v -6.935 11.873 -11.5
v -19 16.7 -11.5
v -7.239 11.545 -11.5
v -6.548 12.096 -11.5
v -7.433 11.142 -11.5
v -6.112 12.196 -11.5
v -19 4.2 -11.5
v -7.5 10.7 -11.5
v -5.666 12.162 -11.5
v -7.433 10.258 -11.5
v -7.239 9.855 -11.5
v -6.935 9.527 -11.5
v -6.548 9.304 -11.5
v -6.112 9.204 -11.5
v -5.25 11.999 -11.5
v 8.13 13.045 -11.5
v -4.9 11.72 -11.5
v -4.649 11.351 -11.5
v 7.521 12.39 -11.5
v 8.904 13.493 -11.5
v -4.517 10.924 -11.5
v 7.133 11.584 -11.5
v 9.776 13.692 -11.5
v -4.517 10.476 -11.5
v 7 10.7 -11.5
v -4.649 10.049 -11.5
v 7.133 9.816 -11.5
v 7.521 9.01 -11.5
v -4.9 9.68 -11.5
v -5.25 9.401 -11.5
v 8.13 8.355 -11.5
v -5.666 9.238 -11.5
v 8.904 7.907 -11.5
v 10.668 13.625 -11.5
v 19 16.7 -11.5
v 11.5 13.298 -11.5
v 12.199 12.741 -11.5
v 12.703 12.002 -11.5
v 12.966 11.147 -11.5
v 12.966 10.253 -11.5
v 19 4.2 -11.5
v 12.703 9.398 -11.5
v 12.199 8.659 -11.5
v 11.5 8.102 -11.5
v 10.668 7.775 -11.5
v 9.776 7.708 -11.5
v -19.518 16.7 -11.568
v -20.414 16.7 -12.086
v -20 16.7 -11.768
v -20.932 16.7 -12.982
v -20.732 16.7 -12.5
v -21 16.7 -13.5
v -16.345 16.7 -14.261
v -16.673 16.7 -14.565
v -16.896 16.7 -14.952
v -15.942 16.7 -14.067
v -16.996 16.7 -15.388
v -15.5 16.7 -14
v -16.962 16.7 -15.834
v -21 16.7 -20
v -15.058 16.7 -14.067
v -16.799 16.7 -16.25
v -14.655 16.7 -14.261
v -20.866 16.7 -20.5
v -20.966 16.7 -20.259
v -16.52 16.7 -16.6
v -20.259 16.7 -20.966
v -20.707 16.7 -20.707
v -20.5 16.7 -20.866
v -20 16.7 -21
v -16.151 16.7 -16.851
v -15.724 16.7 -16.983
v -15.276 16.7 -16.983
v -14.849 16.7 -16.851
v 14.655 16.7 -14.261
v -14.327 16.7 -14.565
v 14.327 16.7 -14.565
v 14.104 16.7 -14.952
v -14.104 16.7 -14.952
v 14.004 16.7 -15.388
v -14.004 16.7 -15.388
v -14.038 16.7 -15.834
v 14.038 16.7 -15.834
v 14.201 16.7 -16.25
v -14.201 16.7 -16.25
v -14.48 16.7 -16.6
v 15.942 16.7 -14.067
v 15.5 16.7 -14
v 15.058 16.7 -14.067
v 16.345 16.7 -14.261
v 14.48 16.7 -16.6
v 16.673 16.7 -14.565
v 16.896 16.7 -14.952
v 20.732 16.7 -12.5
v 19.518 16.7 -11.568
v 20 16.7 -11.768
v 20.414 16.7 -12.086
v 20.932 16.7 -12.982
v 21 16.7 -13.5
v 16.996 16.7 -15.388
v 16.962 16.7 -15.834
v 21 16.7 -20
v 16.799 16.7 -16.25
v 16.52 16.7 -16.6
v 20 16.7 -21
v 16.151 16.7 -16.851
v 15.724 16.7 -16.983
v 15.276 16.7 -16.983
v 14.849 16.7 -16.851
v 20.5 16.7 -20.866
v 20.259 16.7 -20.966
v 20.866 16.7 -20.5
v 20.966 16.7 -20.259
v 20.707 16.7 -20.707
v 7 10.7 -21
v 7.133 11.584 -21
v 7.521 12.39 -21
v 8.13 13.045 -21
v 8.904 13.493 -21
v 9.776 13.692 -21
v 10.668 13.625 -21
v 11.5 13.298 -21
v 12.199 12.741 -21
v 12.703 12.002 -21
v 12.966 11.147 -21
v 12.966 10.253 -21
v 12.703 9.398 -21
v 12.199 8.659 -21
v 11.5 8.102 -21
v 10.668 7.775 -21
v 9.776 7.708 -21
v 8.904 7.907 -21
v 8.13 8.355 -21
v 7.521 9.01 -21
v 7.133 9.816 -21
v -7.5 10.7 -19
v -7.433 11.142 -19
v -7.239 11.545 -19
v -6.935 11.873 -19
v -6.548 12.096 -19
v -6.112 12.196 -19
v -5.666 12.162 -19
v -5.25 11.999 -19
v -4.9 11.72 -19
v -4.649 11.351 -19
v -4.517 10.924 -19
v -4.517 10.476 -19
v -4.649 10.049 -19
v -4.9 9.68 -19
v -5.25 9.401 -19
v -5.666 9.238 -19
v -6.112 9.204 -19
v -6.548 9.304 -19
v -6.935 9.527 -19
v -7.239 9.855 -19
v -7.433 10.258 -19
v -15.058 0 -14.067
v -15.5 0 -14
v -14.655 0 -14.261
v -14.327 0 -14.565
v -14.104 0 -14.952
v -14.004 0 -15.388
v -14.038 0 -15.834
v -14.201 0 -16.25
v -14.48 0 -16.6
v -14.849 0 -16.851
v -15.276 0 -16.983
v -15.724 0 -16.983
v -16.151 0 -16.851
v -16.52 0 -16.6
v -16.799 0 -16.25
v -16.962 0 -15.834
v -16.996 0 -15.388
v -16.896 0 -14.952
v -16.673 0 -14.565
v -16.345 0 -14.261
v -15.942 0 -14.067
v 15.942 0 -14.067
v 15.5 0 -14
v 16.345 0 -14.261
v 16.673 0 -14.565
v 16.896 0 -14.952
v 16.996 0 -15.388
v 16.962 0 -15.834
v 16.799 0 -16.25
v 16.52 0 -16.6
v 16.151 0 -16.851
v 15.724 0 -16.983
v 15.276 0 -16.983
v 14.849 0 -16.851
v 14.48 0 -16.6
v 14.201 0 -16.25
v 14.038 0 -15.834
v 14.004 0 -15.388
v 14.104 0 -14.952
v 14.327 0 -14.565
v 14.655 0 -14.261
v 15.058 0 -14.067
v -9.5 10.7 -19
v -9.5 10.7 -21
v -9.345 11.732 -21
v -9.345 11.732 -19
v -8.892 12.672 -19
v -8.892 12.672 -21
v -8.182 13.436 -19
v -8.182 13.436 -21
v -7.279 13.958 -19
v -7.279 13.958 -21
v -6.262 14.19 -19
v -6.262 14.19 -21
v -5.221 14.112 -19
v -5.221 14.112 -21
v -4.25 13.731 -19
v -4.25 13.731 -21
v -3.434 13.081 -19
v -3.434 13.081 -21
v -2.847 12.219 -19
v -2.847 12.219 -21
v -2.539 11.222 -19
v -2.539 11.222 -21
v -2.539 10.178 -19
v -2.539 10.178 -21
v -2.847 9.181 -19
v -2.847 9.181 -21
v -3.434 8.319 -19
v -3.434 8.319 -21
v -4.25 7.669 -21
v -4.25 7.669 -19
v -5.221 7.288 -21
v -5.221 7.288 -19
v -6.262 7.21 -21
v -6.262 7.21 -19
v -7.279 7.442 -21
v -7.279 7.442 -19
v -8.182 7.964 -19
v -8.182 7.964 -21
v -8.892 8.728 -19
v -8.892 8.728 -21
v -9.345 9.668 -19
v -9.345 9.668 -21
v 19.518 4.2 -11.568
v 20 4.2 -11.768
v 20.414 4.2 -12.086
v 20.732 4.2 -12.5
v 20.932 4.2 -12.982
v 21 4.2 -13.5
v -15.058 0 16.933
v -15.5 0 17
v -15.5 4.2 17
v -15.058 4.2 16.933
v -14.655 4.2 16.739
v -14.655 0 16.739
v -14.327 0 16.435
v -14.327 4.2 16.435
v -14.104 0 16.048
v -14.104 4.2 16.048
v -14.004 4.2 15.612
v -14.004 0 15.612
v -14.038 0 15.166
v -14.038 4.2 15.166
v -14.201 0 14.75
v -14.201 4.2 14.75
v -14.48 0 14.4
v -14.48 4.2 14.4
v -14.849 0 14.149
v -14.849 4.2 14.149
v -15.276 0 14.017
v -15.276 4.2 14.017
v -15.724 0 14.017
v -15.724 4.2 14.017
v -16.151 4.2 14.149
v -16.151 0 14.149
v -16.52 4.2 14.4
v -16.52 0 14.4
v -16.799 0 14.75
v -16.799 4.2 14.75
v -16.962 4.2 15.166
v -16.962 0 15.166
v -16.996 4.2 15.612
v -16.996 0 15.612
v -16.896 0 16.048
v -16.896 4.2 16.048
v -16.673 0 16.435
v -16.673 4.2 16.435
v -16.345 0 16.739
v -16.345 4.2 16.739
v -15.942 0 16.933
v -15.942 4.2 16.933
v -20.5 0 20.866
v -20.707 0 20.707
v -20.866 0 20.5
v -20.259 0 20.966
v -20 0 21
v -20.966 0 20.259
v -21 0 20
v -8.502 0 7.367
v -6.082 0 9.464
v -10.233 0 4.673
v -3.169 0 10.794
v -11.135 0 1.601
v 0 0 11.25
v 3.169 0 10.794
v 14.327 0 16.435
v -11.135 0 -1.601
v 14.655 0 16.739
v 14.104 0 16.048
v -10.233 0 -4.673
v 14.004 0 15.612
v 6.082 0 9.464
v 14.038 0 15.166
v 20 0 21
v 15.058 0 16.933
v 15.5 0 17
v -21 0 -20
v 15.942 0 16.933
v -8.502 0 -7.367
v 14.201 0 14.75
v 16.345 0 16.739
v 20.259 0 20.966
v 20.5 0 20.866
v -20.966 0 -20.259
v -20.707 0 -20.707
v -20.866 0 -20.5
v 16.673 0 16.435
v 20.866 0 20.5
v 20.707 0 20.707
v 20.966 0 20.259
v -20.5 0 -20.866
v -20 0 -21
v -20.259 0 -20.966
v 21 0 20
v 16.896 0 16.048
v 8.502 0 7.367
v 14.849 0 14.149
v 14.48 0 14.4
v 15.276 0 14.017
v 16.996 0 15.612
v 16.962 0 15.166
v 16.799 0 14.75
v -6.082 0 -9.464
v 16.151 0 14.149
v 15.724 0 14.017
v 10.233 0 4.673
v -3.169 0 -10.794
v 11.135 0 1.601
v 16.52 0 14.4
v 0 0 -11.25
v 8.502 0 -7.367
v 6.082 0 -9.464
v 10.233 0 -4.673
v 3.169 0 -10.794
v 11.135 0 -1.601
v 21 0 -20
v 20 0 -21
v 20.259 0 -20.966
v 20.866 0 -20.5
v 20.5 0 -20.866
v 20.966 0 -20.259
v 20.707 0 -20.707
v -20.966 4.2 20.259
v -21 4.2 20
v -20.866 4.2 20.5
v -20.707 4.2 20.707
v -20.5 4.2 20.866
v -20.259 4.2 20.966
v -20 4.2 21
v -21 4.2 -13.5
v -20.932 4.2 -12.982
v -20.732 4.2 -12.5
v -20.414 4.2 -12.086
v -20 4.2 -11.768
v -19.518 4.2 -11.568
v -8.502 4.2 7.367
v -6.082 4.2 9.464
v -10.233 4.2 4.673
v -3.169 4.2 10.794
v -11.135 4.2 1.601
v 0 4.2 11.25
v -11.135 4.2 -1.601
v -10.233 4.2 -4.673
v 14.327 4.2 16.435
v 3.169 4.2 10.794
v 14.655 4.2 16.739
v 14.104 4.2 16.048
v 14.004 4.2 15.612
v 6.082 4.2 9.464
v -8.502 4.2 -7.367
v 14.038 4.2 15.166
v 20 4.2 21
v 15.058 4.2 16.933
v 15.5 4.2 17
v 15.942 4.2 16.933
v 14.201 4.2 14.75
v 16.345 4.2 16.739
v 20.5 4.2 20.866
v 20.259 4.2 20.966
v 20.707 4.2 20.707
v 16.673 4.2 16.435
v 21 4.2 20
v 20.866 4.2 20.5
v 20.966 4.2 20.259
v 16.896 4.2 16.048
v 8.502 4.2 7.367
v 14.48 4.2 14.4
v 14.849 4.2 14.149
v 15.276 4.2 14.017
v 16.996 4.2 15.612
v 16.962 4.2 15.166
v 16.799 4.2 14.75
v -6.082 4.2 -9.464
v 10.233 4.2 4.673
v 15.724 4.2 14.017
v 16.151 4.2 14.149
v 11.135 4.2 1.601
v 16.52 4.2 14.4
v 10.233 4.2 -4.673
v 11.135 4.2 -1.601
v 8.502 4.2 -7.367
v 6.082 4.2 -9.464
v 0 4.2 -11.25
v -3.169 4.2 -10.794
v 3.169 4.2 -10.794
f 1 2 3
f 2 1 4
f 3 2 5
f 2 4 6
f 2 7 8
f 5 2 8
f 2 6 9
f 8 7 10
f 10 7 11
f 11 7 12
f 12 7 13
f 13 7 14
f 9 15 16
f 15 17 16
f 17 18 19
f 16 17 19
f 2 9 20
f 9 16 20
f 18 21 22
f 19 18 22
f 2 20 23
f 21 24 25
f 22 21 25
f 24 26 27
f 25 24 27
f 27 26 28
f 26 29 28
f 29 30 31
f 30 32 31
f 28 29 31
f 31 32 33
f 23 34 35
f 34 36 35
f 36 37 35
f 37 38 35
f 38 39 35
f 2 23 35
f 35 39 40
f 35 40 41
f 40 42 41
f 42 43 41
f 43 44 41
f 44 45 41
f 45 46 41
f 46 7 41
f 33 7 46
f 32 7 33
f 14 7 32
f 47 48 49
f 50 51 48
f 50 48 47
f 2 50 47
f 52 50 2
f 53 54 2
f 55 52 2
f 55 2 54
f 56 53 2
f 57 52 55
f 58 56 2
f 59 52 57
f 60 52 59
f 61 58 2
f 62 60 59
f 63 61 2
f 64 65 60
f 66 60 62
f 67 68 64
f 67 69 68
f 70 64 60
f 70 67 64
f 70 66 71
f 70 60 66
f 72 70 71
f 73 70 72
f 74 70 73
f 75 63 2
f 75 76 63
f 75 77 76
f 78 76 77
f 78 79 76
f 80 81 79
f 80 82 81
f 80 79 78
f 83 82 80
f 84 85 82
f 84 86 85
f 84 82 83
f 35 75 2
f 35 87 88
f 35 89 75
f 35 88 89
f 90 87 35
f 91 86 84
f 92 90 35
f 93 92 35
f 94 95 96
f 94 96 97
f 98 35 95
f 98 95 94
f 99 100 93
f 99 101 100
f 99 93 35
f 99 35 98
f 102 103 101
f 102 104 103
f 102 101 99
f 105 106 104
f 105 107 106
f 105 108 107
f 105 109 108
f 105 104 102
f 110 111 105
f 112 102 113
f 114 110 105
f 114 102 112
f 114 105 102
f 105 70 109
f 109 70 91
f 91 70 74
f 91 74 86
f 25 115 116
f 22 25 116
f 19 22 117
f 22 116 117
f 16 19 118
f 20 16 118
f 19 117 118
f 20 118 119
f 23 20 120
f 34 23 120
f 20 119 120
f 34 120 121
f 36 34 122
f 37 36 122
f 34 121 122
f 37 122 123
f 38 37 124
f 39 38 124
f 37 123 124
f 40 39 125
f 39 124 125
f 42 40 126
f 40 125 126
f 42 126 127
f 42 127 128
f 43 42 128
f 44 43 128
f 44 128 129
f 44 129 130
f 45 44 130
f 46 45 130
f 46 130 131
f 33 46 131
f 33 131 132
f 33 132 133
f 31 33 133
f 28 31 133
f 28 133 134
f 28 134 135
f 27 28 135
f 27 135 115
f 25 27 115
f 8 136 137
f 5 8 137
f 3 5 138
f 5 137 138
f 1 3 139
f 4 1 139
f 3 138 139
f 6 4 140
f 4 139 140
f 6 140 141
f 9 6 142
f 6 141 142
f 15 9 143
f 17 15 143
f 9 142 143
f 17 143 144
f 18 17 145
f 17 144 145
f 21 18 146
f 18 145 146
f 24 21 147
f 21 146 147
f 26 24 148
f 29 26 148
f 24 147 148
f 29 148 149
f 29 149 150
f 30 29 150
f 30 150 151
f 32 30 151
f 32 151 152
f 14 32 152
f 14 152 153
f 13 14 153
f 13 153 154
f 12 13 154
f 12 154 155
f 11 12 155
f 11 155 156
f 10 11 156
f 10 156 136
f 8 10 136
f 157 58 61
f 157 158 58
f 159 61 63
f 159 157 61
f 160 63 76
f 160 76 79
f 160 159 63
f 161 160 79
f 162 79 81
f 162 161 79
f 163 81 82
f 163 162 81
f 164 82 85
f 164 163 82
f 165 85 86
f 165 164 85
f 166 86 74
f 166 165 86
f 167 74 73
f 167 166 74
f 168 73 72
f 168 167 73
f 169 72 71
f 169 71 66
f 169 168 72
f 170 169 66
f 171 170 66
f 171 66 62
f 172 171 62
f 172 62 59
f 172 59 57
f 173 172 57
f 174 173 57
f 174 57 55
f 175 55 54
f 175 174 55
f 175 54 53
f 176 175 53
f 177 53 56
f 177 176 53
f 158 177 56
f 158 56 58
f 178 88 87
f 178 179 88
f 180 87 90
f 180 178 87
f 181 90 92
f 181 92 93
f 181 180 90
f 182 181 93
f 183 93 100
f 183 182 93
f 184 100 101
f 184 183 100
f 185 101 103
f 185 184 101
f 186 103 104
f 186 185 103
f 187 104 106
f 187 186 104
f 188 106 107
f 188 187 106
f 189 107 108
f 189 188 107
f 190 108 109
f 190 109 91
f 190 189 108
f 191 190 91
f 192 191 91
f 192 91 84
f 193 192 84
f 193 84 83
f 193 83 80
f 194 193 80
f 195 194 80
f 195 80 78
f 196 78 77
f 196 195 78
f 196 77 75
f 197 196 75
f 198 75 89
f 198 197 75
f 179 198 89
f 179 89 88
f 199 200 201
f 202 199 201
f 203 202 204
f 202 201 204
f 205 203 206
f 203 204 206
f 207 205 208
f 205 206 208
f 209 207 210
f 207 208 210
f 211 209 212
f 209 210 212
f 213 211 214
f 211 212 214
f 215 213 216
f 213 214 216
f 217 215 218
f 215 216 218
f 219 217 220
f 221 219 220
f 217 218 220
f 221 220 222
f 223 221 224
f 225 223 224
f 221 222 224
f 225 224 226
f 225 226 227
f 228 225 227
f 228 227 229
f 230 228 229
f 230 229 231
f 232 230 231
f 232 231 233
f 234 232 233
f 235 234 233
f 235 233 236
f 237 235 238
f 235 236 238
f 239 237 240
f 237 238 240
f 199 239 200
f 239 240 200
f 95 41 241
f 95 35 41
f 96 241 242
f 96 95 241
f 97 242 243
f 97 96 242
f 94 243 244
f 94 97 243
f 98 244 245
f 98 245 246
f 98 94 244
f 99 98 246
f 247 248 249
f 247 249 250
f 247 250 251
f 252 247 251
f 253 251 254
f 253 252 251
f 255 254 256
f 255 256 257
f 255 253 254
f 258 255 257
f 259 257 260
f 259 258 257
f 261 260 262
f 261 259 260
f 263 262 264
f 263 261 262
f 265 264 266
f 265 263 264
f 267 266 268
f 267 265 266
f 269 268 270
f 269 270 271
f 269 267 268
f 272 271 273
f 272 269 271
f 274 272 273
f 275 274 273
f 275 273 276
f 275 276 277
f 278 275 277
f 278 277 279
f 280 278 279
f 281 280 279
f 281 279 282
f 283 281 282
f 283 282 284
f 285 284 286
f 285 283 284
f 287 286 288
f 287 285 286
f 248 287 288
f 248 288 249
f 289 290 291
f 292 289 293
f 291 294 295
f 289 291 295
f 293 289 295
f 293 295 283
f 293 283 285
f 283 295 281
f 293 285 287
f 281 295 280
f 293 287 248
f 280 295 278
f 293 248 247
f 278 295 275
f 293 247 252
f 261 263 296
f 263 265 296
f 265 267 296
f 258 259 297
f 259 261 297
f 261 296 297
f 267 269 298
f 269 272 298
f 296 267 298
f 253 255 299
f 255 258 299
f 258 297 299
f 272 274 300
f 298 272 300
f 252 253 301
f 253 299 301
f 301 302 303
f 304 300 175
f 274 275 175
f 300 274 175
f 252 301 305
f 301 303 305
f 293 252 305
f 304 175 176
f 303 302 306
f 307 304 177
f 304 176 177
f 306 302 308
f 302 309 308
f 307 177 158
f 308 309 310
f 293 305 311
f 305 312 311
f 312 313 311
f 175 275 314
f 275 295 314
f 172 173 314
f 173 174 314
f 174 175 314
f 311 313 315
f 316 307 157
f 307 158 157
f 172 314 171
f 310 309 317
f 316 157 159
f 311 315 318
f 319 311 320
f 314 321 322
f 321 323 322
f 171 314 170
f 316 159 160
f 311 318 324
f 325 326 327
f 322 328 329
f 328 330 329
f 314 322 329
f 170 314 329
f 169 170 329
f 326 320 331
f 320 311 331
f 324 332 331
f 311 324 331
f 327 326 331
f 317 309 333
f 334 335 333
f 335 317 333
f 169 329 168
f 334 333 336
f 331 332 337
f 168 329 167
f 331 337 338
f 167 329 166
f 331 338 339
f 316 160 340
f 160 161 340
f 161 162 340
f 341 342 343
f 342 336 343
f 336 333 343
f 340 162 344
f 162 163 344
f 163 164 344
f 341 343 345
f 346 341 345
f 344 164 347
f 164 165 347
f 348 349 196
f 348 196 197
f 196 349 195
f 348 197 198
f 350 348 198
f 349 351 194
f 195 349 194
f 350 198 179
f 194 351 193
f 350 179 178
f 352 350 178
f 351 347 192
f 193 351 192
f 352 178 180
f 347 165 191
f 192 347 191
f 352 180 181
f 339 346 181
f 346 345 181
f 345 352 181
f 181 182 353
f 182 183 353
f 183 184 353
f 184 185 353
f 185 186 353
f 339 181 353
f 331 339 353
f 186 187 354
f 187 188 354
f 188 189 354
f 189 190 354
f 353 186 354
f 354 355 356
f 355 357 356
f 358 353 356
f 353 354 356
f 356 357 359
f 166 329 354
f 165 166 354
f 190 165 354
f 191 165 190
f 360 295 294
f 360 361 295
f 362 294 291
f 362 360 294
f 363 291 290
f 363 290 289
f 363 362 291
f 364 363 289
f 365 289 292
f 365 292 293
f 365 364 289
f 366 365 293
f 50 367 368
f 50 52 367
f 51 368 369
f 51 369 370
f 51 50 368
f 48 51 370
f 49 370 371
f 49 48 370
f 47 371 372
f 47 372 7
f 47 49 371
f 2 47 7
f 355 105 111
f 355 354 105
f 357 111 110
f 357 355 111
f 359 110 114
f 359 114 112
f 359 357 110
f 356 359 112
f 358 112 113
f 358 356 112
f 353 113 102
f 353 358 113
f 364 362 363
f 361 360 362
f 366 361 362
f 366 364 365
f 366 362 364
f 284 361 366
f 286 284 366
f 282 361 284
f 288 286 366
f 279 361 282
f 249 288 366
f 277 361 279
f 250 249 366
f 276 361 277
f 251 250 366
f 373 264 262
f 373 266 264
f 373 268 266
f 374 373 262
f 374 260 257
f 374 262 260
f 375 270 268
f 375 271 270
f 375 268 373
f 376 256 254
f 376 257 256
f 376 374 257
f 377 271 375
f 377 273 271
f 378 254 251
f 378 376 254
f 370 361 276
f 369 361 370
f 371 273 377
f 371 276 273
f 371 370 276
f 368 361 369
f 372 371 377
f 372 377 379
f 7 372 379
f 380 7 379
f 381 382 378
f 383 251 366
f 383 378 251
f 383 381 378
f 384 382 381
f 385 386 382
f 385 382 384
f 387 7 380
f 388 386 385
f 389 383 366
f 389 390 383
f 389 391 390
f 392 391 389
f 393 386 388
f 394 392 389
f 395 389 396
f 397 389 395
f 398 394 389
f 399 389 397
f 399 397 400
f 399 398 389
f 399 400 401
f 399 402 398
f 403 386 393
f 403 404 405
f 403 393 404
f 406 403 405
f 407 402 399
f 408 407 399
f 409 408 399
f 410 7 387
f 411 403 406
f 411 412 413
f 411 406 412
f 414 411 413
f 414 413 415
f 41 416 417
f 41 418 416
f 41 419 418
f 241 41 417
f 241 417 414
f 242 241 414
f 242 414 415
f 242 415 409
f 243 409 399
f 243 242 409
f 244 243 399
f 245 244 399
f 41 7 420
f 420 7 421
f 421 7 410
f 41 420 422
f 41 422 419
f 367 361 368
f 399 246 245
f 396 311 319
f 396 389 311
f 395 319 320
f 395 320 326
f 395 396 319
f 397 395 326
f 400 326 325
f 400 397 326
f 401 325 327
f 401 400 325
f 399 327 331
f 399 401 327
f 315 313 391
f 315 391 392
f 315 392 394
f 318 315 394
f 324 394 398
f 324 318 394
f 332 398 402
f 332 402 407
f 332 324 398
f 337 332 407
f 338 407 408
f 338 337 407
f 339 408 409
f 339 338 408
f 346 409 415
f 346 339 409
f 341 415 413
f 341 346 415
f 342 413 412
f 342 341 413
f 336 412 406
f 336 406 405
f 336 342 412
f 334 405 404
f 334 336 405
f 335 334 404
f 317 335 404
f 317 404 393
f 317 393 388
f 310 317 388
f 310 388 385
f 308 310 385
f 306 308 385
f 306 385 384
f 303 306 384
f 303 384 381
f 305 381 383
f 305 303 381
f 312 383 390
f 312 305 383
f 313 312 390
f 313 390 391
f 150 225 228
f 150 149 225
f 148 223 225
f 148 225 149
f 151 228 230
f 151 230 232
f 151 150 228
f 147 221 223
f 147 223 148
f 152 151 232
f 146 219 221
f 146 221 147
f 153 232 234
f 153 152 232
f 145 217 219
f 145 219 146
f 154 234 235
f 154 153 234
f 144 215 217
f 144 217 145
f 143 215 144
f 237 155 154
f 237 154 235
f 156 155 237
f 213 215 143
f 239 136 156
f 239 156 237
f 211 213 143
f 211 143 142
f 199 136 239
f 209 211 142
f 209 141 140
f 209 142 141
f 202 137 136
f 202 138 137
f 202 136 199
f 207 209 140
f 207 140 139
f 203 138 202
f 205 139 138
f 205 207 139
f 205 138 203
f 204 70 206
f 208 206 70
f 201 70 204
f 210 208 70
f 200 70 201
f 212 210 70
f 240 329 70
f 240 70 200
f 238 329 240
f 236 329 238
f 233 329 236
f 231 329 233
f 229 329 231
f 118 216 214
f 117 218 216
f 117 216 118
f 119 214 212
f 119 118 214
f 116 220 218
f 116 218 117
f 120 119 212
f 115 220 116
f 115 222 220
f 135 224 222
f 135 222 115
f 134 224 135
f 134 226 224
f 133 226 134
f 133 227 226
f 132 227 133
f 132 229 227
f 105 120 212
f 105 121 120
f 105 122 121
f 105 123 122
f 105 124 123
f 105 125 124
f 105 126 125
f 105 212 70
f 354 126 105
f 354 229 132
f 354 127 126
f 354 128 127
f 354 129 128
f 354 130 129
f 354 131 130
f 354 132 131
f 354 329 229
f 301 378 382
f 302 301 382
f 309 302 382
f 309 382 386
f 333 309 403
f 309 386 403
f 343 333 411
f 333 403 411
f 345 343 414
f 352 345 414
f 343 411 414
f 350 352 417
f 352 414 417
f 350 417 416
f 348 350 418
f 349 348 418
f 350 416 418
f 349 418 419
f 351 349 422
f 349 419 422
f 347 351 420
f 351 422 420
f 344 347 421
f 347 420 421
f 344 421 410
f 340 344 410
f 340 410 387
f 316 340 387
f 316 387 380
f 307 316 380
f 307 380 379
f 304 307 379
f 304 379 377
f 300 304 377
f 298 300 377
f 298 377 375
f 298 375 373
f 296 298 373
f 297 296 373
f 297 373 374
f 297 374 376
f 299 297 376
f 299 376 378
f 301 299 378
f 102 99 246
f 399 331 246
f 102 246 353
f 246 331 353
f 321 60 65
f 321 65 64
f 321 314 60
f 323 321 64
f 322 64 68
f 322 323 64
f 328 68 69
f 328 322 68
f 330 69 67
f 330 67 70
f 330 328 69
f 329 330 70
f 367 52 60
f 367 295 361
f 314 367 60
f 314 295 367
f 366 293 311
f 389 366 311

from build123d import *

# Parameters (mm, degrees)
SKETCH_1_W          = 42
SKETCH_1_H          = 42
SKETCH_1_R          = 1.5
EXTRUDE_1_DEPTH     = 4.2
SKETCH_2_W          = 42
SKETCH_2_H          = 9.5
SKETCH_2_R          = 1.5
EXTRUDE_2_DEPTH     = 12.5
SKETCH_3_R          = 11.25
CUT_EXTRUDE_1_DEPTH = 33.221886971
SKETCH_4_R          = 3
SKETCH_4_R_2        = 1.5
CUT_EXTRUDE_2_DEPTH = 50.838639628
SKETCH_5_R          = 3.5
CUT_EXTRUDE_3_DEPTH = 2
FILLET_2_R          = 1
FILLET_3_R          = 2


with BuildPart() as part:
    # 草图1 → 凸台-拉伸1 (new body)
    with BuildSketch(Plane(origin=(0, 0, 0), x_dir=(1, 0, 0), z_dir=(0, 1, 0))):
        Rectangle(SKETCH_1_W, SKETCH_1_H)
        with Locations(Location((-15.5, 15.5, 0), (0, 0, 270))):
            Circle(SKETCH_1_R, mode=Mode.SUBTRACT)
        with Locations(Location((15.5, 15.5, 0), (0, 0, 270))):
            Circle(SKETCH_1_R, mode=Mode.SUBTRACT)
        with Locations(Location((-15.5, -15.5, 0), (0, 0, 270))):
            Circle(SKETCH_1_R, mode=Mode.SUBTRACT)
        with Locations(Location((15.5, -15.5, 0), (0, 0, 270))):
            Circle(SKETCH_1_R, mode=Mode.SUBTRACT)
    extrude(amount=EXTRUDE_1_DEPTH)

    # 草图2 → 凸台-拉伸2 (add)
    with BuildSketch(Plane(origin=(0, 4.2, 0), x_dir=(1, 0, 0), z_dir=(0, 1, 0))):
        with Locations((0, 16.25)):
            Rectangle(SKETCH_2_W, SKETCH_2_H)
        with Locations(Location((-15.5, 15.5, 0), (0, 0, 270))):
            Circle(SKETCH_2_R, mode=Mode.SUBTRACT)
        with Locations(Location((15.5, 15.5, 0), (0, 0, 270))):
            Circle(SKETCH_2_R, mode=Mode.SUBTRACT)
    extrude(amount=EXTRUDE_2_DEPTH)

    # 草图3 → 切除-拉伸1 (cut, through all)
    with BuildSketch(Plane(origin=(0, 4.2, 0), x_dir=(1, 0, 0), z_dir=(0, 1, 0))):
        with Locations(Location((0, 0, 0), (0, 0, 270))):
            Circle(SKETCH_3_R)
    extrude(amount=-CUT_EXTRUDE_1_DEPTH, mode=Mode.SUBTRACT)

    # 草图4 → 切除-拉伸2 (cut, through all)
    with BuildSketch(Plane(origin=(0, 0, -21), x_dir=(-1, 0, 0), z_dir=(0, 0, -1))):
        with Locations((-10, 10.7)):
            Circle(SKETCH_4_R)
        with Locations((6, 10.7)):
            Circle(SKETCH_4_R_2)
    extrude(amount=-CUT_EXTRUDE_2_DEPTH, mode=Mode.SUBTRACT)

    # 草图5 → 切除-拉伸3 (cut)
    with BuildSketch(Plane(origin=(0, 0, -21), x_dir=(-1, 0, 0), z_dir=(0, 0, -1))):
        with Locations((6, 10.7)):
            Circle(SKETCH_5_R)
    extrude(amount=-CUT_EXTRUDE_3_DEPTH, mode=Mode.SUBTRACT)

    # 圆角2
    fillet_2_edges = [part.edges().sort_by_distance(p)[0] for p in [
        (21, 2.1, 21),
        (-21, 2.1, 21),
        (-21, 8.35, -21),
        (21, 8.35, -21),
    ]]
    fillet(fillet_2_edges, radius=FILLET_2_R)

    # 圆角3
    fillet_3_edges = [part.edges().sort_by_distance(p)[0] for p in [
        (-21, 10.45, -11.5),
        (21, 10.45, -11.5),
    ]]
    fillet(fillet_3_edges, radius=FILLET_3_R)


solid = part.part
